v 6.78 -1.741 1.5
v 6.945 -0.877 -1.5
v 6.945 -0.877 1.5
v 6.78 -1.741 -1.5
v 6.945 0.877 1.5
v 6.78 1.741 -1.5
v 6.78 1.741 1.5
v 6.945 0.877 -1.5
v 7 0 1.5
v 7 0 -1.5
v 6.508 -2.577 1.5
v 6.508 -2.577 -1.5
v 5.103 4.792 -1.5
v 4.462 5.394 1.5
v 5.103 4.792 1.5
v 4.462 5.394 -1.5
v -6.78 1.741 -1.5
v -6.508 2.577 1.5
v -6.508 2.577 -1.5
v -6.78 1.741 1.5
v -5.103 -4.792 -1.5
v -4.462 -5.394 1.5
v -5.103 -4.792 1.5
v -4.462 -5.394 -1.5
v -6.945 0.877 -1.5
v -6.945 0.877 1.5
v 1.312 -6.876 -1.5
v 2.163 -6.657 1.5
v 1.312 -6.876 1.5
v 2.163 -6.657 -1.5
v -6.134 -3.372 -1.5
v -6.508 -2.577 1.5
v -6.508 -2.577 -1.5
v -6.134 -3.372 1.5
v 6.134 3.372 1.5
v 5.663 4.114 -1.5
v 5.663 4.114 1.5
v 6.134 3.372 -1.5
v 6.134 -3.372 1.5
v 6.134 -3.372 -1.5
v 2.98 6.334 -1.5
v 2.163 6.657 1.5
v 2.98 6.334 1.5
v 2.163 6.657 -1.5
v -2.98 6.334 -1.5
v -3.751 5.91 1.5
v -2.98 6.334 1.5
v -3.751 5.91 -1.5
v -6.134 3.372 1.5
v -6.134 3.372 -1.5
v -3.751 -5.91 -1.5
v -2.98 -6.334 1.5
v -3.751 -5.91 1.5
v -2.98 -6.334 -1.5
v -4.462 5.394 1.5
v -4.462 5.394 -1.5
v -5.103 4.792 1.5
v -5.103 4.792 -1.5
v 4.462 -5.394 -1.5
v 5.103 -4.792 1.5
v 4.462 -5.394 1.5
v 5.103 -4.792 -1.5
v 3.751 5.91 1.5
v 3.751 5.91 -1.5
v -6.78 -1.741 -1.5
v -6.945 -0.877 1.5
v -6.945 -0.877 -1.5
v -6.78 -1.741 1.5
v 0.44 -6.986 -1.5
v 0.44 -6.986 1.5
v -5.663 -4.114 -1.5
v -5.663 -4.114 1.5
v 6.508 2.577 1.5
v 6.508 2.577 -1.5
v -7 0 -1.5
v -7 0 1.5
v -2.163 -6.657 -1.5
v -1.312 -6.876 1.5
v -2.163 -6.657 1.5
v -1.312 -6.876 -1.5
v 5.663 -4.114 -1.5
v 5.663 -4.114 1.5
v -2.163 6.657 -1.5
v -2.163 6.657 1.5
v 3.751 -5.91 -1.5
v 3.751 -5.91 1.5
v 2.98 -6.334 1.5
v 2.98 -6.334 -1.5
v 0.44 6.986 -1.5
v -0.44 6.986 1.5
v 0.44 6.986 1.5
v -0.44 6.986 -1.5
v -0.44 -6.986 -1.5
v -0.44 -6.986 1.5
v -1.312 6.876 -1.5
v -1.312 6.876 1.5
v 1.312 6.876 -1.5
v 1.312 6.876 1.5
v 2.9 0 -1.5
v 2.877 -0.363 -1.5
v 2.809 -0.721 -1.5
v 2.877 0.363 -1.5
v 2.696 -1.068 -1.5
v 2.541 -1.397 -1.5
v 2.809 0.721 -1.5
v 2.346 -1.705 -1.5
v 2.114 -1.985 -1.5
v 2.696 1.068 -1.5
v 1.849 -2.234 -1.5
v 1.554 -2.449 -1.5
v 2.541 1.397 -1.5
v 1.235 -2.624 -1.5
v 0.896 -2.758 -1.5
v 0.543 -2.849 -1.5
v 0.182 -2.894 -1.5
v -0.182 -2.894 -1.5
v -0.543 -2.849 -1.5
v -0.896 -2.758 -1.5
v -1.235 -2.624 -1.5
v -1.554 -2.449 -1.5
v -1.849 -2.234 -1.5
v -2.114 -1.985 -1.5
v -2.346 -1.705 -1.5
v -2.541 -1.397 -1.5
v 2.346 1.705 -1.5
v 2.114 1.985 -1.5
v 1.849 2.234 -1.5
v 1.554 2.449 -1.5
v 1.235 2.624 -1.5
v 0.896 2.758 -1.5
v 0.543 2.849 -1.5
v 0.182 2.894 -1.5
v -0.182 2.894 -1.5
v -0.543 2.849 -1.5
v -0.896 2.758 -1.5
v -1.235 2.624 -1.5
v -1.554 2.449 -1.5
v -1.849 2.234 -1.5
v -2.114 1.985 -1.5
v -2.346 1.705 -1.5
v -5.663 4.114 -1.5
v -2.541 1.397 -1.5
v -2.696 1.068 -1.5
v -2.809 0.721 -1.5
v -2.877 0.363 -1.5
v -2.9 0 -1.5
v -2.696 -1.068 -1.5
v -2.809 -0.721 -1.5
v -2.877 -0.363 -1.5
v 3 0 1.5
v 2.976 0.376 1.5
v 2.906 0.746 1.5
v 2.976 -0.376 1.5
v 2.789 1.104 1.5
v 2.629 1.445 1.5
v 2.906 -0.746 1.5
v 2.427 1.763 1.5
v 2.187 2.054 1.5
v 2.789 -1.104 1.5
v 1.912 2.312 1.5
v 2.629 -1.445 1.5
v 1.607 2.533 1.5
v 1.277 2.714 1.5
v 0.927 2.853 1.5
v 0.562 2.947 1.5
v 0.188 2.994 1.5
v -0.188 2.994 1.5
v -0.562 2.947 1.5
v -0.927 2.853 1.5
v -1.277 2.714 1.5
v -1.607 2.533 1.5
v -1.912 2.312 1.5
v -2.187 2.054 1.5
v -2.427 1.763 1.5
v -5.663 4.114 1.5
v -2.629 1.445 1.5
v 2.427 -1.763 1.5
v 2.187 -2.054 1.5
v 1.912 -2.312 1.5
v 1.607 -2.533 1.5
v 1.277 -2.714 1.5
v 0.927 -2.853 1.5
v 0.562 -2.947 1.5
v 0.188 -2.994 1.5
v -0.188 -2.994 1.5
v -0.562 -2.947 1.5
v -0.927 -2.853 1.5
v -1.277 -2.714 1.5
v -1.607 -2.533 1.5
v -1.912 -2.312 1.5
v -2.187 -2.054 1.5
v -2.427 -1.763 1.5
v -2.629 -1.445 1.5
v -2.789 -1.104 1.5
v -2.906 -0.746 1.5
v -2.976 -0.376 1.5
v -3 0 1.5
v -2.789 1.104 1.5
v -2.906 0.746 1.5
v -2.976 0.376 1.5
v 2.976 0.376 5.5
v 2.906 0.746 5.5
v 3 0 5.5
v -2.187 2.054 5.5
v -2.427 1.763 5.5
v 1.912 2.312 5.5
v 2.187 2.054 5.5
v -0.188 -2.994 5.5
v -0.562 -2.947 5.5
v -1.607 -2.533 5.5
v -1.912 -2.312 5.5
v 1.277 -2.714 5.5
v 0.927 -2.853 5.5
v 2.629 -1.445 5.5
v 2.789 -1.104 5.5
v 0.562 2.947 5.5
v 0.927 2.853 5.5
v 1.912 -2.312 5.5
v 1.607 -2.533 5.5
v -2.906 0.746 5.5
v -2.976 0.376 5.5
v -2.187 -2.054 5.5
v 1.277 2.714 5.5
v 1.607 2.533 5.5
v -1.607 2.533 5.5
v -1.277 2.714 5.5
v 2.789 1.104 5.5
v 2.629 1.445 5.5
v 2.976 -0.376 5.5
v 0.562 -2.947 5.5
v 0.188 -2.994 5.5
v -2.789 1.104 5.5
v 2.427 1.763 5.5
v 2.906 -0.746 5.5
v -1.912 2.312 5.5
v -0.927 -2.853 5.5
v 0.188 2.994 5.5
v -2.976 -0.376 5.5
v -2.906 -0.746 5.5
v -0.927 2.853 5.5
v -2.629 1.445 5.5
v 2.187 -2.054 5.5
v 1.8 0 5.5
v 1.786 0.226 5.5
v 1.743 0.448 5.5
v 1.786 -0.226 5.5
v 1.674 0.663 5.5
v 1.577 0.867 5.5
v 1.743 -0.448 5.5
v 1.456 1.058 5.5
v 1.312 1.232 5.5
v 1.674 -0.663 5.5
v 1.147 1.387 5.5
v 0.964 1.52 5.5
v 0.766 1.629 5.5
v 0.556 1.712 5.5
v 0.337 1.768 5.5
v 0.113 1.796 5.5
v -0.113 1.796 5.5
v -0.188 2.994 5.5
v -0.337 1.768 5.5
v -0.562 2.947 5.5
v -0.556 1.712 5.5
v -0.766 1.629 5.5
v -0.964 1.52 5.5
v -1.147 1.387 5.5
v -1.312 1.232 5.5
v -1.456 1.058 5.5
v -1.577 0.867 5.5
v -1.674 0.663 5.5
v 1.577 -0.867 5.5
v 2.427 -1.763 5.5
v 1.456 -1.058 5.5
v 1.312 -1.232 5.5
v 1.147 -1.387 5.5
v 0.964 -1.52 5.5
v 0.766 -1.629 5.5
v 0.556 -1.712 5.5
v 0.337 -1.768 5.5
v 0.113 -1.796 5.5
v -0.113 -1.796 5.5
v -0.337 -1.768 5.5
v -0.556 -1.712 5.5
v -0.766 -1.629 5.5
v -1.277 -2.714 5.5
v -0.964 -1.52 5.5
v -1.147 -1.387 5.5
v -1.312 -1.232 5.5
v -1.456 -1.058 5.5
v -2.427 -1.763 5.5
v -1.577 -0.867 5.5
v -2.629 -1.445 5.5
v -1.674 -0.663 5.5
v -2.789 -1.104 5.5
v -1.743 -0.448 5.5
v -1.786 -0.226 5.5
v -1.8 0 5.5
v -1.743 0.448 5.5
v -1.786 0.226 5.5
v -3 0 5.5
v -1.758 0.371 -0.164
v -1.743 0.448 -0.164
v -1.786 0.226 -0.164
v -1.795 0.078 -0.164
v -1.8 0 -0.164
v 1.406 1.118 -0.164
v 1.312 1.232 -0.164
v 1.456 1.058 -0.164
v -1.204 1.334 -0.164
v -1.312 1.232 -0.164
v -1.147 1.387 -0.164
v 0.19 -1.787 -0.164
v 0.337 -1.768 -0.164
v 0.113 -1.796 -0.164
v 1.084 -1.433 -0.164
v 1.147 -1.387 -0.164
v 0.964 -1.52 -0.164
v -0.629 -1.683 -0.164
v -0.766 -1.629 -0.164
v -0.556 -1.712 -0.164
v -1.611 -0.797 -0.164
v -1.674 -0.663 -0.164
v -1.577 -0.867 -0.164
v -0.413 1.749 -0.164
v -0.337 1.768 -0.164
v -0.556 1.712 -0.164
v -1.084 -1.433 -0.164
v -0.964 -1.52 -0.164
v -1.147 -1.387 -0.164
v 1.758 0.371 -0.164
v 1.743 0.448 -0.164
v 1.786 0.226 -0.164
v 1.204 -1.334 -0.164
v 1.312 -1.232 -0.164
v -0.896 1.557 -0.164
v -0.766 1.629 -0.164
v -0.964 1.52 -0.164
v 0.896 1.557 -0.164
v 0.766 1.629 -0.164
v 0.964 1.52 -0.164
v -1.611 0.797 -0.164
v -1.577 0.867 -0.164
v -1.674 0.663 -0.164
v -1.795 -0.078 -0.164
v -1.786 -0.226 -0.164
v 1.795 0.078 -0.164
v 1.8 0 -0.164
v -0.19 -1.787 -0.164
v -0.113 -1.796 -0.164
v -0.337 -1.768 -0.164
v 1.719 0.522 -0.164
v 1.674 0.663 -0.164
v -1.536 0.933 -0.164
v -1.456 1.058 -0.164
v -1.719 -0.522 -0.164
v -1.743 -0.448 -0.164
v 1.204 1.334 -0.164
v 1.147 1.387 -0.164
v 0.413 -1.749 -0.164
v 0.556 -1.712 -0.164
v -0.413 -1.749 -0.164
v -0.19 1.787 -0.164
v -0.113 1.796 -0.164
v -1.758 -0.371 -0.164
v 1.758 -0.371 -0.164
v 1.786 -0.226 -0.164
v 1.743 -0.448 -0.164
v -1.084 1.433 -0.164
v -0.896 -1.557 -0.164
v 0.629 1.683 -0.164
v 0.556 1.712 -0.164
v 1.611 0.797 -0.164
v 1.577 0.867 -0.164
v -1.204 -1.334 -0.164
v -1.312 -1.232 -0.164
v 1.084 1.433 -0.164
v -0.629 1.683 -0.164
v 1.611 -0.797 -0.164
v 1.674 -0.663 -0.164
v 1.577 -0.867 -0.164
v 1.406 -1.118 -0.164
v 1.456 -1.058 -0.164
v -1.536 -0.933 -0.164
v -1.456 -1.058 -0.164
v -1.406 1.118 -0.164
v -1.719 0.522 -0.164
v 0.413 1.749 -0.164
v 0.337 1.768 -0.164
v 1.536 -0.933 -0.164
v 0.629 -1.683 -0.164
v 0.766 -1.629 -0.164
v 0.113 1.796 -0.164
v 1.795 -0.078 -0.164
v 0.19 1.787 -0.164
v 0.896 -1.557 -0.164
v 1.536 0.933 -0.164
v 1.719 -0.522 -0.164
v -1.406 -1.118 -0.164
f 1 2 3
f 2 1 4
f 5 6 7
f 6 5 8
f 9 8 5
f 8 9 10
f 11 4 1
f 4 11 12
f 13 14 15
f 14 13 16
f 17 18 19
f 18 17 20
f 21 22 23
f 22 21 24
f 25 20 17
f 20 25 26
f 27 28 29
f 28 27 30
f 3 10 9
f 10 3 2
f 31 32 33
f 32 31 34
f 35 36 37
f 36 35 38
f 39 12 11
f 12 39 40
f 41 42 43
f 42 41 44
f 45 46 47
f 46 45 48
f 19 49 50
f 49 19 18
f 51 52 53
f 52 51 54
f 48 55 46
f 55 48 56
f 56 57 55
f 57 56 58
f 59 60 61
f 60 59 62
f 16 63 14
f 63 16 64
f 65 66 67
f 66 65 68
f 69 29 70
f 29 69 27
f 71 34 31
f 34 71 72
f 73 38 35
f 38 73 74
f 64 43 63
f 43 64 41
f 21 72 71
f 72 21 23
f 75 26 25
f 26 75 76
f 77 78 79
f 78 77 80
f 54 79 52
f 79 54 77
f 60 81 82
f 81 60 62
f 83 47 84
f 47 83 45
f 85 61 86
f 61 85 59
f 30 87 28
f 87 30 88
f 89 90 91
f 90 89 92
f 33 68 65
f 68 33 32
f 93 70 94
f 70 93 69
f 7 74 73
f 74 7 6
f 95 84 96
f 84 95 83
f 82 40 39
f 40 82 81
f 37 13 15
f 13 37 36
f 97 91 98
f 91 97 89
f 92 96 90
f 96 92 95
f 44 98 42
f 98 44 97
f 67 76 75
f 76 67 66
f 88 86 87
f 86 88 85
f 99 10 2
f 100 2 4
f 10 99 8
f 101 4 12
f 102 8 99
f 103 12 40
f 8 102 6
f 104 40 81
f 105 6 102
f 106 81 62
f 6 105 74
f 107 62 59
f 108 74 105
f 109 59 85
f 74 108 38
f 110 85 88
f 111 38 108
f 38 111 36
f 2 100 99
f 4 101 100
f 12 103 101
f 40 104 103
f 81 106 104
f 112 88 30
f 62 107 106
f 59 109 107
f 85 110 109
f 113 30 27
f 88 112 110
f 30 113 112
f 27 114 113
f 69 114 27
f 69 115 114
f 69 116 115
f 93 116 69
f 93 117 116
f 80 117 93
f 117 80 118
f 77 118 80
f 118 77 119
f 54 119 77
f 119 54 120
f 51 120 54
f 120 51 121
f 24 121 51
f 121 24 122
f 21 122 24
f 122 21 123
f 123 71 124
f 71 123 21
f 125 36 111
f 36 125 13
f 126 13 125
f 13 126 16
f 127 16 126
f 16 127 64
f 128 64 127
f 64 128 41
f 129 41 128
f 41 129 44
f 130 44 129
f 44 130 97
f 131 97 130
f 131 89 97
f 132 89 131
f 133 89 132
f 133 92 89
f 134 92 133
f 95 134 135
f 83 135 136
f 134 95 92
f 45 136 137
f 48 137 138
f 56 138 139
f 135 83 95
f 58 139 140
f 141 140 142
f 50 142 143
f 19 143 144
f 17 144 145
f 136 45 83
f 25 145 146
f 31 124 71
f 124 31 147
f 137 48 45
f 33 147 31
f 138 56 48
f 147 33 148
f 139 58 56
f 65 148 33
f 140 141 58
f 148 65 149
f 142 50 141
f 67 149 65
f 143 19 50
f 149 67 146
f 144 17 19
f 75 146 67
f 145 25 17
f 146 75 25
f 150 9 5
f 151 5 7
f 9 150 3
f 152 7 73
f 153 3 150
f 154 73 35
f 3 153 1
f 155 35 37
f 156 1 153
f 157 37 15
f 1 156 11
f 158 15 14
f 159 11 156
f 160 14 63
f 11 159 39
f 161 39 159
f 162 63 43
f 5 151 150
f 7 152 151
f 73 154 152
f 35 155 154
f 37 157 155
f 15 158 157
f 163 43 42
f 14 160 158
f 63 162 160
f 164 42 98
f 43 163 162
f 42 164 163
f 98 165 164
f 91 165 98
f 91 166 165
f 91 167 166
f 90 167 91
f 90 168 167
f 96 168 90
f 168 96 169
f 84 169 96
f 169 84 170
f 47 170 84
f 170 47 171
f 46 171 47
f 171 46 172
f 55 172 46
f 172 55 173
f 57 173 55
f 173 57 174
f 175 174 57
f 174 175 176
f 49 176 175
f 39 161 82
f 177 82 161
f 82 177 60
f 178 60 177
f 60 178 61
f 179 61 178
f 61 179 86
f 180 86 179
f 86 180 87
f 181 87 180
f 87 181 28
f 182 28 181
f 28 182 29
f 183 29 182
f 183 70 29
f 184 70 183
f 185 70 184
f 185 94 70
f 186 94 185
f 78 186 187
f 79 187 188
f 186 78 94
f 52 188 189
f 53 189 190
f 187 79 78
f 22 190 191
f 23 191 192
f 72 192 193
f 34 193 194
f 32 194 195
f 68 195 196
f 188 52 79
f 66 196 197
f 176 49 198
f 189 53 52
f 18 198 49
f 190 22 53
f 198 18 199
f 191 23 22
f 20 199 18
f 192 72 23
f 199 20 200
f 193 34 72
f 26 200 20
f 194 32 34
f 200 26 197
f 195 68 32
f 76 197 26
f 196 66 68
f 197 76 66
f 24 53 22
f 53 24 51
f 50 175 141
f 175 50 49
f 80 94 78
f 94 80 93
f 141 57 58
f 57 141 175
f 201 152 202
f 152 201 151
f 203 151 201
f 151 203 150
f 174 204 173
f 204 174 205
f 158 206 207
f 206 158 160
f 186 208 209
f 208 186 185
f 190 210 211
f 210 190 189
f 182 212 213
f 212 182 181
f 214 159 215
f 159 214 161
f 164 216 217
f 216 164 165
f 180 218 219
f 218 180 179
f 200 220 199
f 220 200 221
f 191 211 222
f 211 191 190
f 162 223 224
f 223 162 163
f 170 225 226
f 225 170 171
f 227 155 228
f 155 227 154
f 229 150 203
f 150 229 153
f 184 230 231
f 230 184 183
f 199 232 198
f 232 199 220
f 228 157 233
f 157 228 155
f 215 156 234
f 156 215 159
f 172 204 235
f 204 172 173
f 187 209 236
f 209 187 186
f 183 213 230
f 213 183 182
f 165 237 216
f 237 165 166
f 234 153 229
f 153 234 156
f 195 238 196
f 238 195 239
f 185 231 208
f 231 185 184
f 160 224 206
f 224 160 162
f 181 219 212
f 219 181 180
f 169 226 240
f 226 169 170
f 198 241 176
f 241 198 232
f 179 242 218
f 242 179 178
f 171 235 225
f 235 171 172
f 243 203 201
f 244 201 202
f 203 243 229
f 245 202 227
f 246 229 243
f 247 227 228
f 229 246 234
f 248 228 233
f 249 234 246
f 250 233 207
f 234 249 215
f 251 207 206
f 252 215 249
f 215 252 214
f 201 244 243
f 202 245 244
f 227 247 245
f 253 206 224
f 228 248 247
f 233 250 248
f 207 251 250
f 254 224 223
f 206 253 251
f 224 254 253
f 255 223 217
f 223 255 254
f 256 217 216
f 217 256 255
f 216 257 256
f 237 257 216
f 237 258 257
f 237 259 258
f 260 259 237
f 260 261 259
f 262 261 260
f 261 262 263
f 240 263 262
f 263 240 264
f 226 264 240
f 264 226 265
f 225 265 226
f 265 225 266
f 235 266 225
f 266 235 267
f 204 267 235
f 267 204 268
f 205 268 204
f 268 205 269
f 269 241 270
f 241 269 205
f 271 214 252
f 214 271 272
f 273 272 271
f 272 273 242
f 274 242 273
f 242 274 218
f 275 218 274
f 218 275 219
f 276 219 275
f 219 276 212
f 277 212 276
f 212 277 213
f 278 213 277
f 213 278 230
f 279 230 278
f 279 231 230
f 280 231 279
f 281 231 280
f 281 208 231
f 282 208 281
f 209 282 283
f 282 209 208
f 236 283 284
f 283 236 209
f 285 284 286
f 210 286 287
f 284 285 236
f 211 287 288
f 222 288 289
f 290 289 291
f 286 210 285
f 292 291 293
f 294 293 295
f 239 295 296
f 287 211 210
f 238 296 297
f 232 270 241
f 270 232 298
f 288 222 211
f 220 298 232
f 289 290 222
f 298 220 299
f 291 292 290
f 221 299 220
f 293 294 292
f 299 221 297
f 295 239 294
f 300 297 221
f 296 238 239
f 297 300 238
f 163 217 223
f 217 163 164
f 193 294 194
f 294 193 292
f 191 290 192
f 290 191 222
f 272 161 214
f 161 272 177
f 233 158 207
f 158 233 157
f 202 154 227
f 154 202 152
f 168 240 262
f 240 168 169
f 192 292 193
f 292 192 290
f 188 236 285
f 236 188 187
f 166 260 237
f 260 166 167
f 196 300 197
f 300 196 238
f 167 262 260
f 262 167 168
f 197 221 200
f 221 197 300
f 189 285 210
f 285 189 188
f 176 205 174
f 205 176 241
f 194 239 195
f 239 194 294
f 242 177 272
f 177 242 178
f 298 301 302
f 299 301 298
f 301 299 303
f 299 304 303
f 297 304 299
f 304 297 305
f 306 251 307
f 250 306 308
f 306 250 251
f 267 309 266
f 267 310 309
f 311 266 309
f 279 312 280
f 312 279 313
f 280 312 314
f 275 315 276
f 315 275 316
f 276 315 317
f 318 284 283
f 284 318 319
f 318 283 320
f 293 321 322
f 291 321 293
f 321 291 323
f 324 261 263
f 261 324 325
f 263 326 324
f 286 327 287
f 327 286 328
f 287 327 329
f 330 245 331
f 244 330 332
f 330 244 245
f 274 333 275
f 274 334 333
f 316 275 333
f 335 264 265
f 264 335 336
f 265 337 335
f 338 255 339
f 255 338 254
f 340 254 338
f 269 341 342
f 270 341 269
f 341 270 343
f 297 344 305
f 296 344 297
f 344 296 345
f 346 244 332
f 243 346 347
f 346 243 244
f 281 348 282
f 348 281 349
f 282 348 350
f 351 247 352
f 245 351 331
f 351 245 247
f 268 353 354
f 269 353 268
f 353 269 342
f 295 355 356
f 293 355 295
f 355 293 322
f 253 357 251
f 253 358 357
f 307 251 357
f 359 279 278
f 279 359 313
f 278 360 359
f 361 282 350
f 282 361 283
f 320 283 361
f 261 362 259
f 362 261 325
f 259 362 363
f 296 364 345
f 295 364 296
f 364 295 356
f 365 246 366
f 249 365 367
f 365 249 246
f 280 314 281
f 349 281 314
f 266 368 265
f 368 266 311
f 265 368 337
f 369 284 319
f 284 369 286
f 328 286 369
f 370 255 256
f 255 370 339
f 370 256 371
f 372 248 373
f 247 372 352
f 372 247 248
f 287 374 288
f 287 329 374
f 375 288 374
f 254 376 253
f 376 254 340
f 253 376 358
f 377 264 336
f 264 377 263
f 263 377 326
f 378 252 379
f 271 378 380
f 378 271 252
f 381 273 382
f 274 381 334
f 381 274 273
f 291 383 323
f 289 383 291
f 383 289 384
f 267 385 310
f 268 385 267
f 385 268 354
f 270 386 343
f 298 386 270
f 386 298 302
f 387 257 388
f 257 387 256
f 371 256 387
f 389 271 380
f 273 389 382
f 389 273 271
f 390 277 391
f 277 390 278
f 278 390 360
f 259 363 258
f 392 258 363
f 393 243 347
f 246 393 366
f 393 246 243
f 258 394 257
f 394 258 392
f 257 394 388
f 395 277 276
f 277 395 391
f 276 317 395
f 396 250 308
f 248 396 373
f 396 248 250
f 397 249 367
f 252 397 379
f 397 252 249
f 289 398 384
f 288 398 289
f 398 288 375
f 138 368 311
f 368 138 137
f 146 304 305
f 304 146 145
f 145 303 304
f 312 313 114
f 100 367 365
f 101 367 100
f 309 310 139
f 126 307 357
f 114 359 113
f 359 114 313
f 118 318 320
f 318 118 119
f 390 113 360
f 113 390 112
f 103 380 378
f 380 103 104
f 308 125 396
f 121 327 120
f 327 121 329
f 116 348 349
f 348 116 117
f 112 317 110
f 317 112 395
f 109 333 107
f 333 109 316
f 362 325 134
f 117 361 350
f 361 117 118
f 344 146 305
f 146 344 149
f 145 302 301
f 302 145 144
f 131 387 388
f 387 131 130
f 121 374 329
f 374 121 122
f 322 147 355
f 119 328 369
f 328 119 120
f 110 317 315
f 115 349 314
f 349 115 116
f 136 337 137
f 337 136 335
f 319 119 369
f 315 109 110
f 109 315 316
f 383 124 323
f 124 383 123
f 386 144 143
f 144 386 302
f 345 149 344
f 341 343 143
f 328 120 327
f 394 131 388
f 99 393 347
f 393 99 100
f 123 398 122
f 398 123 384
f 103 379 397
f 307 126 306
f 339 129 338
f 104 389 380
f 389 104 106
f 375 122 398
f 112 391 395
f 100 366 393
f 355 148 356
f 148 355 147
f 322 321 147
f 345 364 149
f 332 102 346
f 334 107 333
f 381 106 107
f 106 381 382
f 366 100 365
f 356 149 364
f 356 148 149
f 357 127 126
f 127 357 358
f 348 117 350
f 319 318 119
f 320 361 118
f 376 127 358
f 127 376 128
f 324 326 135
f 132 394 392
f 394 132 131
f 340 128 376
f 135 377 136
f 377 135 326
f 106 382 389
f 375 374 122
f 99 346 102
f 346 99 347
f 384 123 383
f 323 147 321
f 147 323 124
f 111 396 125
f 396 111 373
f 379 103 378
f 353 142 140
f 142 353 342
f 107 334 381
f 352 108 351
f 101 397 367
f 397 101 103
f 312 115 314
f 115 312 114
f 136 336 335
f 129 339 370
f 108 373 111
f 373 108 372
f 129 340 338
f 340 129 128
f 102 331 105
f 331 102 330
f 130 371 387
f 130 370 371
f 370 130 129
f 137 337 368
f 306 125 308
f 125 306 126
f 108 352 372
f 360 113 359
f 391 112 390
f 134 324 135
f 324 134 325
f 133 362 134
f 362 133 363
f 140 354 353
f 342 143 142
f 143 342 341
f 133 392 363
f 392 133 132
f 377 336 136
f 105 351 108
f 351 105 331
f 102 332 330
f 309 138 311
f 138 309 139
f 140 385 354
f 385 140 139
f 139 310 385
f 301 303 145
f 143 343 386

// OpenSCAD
$fn = 50;


difference() {
	union() {
		translate(v = [0, 0, -1.5000000000]) {
			cylinder(h = 3, r = 7.0000000000);
		}
		translate(v = [0, 0, -1.5000000000]) {
			cylinder(h = 7, r = 3.0000000000);
		}
	}
	union() {
		translate(v = [0, 0, -1.5000000000]) {
			rotate(a = [0, 180, 0]) {
				difference() {
					union() {
						translate(v = [0, 0, -7.0000000000]) {
							cylinder(h = 7, r = 1.5000000000);
						}
						translate(v = [0, 0, -7.0000000000]) {
							cylinder(h = 7, r = 1.8000000000);
						}
						translate(v = [0, 0, -1.7000000000]) {
							cylinder(h = 1.7000000000, r1 = 1.5000000000, r2 = 2.9000000000);
						}
						translate(v = [0, 0, -7.0000000000]) {
							cylinder(h = 7, r = 1.5000000000);
						}
					}
					union();
				}
			}
		}
		translate(v = [0, 0, -50.0000000000]) {
			cylinder(h = 100, r = 1.5000000000);
		}
	}
}
